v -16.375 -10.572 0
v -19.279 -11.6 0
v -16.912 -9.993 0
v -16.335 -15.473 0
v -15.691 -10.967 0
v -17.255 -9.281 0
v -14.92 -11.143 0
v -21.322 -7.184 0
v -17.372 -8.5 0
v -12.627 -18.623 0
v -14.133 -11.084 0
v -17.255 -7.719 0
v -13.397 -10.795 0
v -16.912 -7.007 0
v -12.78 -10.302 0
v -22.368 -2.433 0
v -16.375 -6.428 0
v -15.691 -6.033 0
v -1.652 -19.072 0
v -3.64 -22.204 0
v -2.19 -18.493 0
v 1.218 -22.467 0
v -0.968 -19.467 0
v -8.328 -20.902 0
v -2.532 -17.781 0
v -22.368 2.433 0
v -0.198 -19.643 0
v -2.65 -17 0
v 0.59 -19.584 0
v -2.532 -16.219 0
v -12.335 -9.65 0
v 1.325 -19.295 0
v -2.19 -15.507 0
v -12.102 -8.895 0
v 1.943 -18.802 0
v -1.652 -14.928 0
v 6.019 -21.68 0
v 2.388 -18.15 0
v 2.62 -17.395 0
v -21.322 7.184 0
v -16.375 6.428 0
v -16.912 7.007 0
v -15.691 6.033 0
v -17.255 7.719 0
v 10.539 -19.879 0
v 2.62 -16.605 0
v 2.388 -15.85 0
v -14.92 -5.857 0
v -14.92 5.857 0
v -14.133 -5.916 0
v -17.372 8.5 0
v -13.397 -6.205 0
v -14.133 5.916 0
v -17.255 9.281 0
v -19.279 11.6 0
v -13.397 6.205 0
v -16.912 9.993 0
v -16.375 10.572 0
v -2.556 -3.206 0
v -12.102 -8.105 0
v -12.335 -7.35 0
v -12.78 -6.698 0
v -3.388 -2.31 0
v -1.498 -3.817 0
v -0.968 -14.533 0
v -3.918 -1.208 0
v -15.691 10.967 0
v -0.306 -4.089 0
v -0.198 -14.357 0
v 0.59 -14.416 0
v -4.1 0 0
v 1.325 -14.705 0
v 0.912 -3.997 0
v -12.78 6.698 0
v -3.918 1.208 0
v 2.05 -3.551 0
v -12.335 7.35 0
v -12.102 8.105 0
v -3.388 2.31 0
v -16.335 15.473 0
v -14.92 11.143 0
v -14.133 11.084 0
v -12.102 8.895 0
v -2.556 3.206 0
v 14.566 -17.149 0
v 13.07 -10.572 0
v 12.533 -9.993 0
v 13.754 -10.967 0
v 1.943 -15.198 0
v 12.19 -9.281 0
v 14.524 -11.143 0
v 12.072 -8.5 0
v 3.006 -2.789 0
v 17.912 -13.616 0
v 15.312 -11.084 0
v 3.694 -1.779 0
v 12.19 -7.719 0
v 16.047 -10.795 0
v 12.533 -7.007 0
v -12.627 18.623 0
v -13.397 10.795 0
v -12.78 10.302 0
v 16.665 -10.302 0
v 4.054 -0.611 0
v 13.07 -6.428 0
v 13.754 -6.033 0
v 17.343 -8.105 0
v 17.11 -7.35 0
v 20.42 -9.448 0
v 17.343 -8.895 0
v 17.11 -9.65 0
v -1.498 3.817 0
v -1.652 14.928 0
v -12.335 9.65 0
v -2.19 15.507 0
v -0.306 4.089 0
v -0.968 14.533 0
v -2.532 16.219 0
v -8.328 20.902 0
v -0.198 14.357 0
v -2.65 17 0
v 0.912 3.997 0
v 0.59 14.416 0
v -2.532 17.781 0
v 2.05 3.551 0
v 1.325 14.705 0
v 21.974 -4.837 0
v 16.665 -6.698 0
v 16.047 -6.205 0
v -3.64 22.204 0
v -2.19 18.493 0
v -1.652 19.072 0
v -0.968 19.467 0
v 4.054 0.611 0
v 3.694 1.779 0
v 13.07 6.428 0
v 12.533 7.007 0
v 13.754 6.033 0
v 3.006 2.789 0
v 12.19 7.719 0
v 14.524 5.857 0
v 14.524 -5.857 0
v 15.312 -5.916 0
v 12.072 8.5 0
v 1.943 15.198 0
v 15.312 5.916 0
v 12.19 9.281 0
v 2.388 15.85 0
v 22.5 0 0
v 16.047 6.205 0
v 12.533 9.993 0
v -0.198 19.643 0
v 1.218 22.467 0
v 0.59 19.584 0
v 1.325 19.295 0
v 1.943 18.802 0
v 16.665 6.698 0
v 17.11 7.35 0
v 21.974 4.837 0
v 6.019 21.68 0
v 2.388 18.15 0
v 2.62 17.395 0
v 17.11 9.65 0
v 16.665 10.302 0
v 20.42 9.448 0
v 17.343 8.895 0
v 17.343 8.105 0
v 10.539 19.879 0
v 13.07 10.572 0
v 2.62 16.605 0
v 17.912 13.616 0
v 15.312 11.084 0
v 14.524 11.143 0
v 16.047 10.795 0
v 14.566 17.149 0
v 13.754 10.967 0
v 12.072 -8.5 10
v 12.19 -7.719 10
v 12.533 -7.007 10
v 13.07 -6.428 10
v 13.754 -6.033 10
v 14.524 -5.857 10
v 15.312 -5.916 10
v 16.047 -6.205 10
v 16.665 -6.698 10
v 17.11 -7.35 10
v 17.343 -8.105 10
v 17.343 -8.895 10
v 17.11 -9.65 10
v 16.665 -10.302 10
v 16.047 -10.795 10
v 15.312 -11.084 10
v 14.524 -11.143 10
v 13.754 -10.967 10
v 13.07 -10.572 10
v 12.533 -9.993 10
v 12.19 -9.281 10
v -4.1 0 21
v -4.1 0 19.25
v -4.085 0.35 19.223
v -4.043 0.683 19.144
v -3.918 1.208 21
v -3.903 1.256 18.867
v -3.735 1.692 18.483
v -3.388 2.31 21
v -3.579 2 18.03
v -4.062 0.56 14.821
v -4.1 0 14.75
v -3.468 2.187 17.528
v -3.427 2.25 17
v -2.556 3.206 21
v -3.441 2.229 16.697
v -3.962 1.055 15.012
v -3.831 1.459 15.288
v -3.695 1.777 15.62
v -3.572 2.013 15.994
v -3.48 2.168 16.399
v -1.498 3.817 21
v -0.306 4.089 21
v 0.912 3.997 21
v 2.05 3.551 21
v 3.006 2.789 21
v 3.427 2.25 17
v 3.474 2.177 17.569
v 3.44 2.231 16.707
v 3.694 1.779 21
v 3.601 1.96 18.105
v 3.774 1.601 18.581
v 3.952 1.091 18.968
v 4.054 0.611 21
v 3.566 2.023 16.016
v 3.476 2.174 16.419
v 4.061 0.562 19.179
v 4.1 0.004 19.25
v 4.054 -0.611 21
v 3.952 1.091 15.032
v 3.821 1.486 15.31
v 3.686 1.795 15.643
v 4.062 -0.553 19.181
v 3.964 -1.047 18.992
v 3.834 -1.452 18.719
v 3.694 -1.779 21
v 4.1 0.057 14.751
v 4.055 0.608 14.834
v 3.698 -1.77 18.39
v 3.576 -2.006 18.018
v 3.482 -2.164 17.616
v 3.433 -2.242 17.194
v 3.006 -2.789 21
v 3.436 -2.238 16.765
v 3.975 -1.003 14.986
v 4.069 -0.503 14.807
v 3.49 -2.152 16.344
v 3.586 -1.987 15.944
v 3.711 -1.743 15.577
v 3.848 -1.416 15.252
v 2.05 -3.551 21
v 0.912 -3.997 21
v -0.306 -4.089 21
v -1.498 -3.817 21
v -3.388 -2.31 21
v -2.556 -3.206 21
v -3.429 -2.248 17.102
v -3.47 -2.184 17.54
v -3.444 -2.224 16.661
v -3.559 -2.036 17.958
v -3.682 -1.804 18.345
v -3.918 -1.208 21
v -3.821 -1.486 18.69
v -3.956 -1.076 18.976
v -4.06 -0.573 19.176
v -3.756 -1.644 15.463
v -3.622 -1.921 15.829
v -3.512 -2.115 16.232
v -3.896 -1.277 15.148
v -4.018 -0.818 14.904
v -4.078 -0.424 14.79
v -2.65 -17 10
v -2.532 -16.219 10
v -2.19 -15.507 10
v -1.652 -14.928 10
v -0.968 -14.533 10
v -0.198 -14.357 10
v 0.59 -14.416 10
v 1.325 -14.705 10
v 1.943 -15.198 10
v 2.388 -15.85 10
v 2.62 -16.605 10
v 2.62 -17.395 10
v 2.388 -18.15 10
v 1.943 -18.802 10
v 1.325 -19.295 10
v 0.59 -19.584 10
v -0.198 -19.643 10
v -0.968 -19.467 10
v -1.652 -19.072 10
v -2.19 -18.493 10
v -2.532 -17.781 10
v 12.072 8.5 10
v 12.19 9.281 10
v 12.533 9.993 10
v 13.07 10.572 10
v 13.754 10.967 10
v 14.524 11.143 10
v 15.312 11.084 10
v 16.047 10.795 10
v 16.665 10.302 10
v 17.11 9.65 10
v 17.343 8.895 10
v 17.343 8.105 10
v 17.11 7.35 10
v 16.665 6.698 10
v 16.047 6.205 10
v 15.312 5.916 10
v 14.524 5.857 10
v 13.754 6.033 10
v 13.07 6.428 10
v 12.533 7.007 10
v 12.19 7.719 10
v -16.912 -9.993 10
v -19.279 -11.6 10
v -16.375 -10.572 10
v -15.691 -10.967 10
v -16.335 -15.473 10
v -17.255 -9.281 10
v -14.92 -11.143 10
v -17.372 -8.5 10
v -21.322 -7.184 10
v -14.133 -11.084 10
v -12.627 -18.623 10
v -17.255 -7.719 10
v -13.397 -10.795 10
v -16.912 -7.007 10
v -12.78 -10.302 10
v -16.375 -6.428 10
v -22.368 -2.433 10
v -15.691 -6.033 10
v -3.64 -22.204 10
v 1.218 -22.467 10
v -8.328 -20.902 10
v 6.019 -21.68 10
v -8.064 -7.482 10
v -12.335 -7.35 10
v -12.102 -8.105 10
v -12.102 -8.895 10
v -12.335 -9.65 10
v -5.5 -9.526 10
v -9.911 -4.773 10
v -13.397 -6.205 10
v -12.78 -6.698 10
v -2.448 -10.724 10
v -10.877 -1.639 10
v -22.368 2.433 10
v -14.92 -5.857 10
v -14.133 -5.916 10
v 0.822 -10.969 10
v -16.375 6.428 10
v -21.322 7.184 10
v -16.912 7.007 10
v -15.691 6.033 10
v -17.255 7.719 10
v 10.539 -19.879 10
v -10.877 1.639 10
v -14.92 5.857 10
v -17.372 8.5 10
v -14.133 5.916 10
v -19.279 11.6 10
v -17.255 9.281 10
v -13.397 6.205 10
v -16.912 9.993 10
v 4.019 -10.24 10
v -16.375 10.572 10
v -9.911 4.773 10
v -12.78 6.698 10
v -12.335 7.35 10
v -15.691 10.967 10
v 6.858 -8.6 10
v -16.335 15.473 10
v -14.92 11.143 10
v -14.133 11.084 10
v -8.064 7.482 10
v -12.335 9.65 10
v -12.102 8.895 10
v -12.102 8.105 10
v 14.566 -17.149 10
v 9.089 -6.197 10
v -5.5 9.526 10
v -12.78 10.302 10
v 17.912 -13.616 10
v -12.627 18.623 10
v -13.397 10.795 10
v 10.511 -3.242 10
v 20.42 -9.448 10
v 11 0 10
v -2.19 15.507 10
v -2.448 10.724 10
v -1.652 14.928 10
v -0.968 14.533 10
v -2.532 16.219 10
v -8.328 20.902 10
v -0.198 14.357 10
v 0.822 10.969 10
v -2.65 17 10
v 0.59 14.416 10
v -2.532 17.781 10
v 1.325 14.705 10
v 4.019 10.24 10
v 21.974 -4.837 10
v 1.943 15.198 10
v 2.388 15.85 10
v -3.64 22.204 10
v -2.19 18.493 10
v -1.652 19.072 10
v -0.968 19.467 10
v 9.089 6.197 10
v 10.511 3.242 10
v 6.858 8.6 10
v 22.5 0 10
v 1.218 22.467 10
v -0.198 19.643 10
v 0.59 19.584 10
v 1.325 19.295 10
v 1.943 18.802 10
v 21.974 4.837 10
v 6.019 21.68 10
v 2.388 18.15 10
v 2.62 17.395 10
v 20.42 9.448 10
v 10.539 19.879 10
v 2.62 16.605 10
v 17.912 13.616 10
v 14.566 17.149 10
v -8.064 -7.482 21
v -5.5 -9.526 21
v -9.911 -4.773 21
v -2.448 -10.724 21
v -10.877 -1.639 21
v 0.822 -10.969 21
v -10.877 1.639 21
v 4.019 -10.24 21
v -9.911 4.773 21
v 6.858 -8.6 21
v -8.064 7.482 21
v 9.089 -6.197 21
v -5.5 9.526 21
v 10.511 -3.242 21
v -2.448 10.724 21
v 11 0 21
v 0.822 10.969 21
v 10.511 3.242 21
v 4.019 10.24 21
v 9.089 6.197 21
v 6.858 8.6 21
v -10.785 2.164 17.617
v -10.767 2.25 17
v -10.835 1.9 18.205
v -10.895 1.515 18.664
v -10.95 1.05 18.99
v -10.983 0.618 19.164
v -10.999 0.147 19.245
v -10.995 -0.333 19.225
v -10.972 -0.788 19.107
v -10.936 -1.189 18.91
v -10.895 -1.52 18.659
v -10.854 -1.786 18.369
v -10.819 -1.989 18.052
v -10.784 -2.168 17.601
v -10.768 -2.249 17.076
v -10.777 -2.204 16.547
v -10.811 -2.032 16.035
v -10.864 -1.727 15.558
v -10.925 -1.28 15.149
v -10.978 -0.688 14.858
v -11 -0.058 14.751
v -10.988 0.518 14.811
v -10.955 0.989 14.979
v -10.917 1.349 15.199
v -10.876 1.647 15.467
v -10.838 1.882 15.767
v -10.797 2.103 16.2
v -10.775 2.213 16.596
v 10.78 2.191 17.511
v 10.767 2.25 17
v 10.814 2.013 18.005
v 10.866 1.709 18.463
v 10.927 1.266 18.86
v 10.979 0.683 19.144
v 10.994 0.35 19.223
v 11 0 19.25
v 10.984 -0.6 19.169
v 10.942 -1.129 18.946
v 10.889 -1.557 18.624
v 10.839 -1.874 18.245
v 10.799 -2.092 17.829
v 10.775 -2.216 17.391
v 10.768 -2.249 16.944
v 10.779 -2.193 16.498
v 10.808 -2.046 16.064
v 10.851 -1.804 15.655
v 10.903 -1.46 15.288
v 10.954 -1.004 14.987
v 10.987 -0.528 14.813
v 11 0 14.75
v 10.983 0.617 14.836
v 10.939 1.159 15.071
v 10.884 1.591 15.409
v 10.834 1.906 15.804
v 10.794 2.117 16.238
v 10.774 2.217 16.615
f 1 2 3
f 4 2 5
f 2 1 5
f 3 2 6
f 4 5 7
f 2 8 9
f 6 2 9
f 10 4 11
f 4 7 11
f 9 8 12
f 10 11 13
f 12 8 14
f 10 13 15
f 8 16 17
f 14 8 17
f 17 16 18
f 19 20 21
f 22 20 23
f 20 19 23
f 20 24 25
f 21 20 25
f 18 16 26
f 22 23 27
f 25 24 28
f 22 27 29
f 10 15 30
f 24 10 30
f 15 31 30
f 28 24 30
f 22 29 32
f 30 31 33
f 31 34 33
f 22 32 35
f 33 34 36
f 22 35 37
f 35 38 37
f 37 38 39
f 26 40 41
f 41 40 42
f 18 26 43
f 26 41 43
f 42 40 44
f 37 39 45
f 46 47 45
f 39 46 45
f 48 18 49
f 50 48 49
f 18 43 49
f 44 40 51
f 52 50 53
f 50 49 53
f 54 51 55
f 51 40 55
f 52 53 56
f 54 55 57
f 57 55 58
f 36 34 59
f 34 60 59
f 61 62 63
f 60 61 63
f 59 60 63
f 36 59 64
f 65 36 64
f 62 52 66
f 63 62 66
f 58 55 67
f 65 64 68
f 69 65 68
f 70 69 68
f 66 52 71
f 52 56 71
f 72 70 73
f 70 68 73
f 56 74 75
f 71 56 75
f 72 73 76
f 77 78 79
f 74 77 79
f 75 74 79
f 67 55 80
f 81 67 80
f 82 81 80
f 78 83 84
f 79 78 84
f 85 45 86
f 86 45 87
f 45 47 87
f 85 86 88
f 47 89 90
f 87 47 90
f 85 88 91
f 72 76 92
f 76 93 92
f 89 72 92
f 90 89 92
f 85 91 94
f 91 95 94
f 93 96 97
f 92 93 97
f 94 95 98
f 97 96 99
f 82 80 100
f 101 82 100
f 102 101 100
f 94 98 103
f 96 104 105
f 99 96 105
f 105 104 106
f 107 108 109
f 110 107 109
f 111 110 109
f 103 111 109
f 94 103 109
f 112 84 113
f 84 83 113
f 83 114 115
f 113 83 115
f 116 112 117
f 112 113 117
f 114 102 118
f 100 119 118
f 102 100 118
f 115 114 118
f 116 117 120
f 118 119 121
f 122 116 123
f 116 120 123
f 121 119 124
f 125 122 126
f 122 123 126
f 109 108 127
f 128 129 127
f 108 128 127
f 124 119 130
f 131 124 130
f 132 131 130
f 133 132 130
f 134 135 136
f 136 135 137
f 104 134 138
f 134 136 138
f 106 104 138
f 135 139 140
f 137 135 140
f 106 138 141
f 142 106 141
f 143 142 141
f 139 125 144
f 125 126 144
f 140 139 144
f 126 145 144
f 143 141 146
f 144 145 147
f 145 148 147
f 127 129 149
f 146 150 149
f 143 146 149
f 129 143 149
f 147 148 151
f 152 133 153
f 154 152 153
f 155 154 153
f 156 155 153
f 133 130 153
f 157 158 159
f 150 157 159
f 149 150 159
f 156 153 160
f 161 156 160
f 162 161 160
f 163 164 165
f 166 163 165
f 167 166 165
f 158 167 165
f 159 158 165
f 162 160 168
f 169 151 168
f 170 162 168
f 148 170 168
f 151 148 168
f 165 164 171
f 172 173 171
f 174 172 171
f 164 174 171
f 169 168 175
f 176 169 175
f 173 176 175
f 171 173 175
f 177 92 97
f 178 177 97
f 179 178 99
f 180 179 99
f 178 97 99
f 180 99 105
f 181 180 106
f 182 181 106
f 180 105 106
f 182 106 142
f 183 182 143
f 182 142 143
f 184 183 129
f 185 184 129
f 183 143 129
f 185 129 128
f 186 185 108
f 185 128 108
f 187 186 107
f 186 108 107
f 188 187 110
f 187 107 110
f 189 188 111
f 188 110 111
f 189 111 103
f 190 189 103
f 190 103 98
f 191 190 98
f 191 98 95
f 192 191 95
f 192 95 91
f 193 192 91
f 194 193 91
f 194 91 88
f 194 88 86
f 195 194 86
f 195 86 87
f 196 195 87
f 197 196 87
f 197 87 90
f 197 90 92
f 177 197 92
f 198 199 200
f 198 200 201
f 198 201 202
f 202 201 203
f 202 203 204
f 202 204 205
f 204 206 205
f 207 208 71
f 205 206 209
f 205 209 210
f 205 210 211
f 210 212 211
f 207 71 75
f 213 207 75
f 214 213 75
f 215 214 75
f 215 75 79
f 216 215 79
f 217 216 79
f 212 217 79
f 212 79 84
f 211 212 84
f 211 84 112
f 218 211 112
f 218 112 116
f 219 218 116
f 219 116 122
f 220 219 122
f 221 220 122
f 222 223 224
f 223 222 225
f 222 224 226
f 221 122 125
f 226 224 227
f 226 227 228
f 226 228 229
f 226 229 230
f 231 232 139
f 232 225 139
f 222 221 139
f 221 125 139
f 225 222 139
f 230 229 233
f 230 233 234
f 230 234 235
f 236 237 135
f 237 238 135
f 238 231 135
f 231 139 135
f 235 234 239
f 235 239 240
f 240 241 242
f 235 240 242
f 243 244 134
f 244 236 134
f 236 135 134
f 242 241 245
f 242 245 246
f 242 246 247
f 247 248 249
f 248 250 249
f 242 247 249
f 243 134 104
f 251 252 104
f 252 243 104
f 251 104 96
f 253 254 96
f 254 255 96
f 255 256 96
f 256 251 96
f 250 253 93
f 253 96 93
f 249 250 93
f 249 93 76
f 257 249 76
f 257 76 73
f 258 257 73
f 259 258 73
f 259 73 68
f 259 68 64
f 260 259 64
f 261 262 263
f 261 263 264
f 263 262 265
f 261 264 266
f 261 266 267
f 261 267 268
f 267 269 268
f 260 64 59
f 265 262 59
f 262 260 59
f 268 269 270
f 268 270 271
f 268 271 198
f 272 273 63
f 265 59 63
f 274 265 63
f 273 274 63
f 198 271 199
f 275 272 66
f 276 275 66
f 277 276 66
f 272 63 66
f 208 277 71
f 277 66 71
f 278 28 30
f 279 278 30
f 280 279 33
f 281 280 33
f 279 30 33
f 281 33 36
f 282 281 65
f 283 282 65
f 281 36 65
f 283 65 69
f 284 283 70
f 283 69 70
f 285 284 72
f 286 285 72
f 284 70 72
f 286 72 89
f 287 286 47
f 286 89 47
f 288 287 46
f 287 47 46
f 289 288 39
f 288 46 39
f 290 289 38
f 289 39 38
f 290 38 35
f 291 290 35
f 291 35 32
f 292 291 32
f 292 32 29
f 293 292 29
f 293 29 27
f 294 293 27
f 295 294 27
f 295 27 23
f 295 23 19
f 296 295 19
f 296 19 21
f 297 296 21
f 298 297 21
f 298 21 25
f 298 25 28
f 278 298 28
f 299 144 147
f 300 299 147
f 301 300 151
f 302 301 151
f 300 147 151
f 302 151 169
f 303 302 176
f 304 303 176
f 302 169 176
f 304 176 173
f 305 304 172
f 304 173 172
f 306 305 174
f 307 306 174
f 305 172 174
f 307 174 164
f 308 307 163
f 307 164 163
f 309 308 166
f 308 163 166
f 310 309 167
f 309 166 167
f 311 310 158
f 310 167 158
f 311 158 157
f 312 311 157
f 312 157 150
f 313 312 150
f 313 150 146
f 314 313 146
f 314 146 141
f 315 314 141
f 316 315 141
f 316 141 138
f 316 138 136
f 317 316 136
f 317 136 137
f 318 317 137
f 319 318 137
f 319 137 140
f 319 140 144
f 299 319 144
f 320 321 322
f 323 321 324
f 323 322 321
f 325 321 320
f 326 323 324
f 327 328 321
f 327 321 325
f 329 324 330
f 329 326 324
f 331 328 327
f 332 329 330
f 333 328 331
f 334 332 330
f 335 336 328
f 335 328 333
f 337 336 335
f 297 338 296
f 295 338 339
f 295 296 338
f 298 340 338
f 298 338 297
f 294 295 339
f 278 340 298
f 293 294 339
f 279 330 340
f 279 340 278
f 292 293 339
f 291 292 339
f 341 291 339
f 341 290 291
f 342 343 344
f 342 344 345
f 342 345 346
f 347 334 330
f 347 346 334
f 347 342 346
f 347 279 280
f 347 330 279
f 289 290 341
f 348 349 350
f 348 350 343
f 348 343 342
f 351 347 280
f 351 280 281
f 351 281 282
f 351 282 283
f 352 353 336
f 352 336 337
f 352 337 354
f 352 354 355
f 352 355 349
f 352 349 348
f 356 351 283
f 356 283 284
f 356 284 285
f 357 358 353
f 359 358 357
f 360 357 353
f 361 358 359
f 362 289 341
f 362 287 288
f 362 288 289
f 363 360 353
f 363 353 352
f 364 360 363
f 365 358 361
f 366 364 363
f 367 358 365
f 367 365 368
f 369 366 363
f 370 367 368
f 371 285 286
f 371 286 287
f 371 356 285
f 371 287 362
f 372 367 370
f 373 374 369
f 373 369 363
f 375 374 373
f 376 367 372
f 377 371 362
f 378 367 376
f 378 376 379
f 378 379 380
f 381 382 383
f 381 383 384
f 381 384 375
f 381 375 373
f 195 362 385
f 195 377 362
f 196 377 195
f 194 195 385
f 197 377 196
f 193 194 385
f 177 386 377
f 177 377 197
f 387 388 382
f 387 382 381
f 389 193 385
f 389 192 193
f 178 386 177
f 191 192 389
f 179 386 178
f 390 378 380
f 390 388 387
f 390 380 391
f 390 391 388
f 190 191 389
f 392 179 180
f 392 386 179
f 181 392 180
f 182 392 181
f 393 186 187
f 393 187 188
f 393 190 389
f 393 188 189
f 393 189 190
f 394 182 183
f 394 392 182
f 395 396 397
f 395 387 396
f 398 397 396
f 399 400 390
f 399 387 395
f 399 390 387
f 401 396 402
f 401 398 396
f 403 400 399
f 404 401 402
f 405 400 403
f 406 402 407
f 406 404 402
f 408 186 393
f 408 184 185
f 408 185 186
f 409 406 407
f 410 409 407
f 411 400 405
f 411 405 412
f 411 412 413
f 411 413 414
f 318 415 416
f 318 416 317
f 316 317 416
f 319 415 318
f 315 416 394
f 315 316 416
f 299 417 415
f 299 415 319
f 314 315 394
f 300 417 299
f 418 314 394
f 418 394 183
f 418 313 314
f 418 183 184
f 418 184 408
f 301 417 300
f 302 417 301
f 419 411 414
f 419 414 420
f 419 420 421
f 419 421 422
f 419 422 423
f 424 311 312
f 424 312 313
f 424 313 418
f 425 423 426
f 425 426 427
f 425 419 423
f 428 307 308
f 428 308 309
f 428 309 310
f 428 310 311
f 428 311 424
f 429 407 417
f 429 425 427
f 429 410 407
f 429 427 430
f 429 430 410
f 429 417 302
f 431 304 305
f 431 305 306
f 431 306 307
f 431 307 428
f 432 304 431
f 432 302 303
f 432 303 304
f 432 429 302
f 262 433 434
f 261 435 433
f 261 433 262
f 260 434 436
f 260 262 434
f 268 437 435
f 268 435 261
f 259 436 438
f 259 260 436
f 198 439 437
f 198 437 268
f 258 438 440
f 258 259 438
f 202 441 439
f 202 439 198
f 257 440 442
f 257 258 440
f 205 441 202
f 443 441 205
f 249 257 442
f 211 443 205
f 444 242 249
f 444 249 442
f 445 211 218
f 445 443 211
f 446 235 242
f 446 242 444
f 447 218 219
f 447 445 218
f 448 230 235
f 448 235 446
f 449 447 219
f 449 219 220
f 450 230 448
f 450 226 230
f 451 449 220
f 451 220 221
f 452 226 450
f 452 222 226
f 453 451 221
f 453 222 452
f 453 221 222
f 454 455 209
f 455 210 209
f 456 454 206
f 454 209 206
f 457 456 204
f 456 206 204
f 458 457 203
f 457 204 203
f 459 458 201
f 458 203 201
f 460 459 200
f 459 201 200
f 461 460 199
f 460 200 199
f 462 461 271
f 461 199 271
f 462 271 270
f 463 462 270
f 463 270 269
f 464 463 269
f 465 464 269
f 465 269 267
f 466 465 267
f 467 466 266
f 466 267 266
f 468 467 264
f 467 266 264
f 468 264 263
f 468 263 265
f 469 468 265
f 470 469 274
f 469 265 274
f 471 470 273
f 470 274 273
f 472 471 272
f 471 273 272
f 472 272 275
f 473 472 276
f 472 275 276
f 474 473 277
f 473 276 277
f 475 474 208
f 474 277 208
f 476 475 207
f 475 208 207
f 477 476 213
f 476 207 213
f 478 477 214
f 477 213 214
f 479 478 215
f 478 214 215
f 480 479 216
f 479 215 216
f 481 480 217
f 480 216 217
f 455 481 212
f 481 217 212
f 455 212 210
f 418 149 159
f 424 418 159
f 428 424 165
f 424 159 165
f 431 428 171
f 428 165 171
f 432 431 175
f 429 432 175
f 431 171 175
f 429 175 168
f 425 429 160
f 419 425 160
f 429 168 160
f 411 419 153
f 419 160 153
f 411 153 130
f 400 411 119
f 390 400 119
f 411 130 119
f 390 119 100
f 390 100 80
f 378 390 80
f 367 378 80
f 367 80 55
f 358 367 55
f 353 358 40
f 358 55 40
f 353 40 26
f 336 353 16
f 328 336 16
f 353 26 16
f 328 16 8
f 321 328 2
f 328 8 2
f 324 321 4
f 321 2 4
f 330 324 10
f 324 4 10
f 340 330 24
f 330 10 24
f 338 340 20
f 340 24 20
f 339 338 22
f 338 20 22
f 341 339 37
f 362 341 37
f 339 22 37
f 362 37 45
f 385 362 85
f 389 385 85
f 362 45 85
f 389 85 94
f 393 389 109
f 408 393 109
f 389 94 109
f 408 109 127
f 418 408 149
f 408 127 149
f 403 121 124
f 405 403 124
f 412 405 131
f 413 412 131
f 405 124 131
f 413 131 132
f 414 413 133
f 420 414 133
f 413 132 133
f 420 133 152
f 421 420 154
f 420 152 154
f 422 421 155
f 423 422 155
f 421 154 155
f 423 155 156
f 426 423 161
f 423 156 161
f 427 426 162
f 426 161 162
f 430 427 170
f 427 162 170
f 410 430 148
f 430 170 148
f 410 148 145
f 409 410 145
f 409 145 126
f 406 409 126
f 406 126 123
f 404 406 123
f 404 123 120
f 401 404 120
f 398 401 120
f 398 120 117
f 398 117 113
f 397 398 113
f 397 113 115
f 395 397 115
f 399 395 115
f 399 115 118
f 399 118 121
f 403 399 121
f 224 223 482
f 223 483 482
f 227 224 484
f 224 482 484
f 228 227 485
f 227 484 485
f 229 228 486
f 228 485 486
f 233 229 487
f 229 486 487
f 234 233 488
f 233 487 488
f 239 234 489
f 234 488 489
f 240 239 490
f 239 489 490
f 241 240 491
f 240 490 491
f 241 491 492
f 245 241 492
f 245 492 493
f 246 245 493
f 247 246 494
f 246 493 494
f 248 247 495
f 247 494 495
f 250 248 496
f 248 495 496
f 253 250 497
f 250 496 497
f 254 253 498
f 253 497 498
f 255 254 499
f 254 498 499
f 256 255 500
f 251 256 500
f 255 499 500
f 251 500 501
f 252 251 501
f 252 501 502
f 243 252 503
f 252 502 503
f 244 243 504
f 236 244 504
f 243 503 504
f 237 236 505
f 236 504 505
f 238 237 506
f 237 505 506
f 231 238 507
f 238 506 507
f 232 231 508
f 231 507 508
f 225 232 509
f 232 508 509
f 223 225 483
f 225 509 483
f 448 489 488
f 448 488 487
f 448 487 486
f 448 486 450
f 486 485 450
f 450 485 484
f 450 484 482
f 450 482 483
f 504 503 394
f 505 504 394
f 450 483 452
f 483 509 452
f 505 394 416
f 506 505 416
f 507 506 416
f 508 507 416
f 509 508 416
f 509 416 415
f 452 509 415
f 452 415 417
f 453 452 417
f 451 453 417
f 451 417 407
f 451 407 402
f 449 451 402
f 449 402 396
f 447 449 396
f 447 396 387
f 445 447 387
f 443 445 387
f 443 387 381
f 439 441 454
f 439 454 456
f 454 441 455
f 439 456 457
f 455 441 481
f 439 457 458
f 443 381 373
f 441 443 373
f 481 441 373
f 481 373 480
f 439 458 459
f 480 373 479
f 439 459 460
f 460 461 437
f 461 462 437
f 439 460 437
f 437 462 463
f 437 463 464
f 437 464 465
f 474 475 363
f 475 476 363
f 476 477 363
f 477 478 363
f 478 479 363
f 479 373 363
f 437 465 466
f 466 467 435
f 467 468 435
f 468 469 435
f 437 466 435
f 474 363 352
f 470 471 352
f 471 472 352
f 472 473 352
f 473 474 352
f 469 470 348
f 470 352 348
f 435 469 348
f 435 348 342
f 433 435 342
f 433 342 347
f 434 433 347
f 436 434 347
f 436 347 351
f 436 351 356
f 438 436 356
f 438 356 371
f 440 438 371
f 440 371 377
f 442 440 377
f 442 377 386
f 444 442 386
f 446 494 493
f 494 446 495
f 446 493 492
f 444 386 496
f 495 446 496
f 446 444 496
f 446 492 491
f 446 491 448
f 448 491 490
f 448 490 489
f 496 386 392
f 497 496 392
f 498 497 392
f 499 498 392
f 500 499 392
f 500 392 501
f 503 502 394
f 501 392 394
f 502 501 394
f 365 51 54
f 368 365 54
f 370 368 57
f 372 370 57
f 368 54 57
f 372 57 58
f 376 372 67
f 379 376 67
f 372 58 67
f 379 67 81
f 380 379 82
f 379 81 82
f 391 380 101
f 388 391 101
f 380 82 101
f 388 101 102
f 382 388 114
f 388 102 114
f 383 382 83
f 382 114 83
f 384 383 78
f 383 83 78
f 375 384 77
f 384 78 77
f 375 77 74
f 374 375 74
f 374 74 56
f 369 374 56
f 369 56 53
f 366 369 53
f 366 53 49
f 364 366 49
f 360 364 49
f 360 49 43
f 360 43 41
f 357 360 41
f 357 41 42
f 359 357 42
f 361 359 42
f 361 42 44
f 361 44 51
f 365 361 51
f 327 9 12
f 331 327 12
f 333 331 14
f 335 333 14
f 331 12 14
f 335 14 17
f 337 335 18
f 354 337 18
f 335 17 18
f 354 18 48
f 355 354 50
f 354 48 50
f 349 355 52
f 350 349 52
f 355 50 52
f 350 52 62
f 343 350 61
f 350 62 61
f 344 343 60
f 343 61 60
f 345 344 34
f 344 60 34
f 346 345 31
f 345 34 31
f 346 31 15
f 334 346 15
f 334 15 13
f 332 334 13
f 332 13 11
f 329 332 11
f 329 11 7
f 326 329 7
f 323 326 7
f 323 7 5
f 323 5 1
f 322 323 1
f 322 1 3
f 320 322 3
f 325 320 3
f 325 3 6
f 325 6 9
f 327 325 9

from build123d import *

# Parameters (mm, degrees)
F0_R     = 22.5
F1_DEPTH = 10
F2_R     = 11
F3_DEPTH = 11
F5_D     = 8.2
F7_D     = 5.3
F8_R     = 2.25
F9_DEPTH = 50


with BuildPart() as f1:
    # F0 (on Top) → F1 (new body)
    with BuildSketch(Plane.XY):
        Circle(F0_R)
    extrude(amount=F1_DEPTH)

    # F2 (on face) → F3 (join)
    with BuildSketch(Plane.XY.offset(10)):
        Circle(F2_R)
    extrude(amount=F3_DEPTH)

    # F5 (through all)
    with Locations(Plane.XY.offset(21)):
        with Locations((0, 0)):
            Hole(F5_D / 2)

    # F7 (through all)
    with Locations(Plane.XY.offset(10)):
        with Locations((0, 17), (14.722432, 8.5), (14.722432, -8.5), (0, -17), (-14.722432, -8.5), (-14.722432, 8.5)):
            Hole(F7_D / 2)

    # F8 (on Right) → F9 (cut, symmetric)
    with BuildSketch(Plane.YZ):
        with Locations((0, 17)):
            Circle(F8_R)
    extrude(amount=F9_DEPTH, both=True, mode=Mode.SUBTRACT)


solid = f1.part
